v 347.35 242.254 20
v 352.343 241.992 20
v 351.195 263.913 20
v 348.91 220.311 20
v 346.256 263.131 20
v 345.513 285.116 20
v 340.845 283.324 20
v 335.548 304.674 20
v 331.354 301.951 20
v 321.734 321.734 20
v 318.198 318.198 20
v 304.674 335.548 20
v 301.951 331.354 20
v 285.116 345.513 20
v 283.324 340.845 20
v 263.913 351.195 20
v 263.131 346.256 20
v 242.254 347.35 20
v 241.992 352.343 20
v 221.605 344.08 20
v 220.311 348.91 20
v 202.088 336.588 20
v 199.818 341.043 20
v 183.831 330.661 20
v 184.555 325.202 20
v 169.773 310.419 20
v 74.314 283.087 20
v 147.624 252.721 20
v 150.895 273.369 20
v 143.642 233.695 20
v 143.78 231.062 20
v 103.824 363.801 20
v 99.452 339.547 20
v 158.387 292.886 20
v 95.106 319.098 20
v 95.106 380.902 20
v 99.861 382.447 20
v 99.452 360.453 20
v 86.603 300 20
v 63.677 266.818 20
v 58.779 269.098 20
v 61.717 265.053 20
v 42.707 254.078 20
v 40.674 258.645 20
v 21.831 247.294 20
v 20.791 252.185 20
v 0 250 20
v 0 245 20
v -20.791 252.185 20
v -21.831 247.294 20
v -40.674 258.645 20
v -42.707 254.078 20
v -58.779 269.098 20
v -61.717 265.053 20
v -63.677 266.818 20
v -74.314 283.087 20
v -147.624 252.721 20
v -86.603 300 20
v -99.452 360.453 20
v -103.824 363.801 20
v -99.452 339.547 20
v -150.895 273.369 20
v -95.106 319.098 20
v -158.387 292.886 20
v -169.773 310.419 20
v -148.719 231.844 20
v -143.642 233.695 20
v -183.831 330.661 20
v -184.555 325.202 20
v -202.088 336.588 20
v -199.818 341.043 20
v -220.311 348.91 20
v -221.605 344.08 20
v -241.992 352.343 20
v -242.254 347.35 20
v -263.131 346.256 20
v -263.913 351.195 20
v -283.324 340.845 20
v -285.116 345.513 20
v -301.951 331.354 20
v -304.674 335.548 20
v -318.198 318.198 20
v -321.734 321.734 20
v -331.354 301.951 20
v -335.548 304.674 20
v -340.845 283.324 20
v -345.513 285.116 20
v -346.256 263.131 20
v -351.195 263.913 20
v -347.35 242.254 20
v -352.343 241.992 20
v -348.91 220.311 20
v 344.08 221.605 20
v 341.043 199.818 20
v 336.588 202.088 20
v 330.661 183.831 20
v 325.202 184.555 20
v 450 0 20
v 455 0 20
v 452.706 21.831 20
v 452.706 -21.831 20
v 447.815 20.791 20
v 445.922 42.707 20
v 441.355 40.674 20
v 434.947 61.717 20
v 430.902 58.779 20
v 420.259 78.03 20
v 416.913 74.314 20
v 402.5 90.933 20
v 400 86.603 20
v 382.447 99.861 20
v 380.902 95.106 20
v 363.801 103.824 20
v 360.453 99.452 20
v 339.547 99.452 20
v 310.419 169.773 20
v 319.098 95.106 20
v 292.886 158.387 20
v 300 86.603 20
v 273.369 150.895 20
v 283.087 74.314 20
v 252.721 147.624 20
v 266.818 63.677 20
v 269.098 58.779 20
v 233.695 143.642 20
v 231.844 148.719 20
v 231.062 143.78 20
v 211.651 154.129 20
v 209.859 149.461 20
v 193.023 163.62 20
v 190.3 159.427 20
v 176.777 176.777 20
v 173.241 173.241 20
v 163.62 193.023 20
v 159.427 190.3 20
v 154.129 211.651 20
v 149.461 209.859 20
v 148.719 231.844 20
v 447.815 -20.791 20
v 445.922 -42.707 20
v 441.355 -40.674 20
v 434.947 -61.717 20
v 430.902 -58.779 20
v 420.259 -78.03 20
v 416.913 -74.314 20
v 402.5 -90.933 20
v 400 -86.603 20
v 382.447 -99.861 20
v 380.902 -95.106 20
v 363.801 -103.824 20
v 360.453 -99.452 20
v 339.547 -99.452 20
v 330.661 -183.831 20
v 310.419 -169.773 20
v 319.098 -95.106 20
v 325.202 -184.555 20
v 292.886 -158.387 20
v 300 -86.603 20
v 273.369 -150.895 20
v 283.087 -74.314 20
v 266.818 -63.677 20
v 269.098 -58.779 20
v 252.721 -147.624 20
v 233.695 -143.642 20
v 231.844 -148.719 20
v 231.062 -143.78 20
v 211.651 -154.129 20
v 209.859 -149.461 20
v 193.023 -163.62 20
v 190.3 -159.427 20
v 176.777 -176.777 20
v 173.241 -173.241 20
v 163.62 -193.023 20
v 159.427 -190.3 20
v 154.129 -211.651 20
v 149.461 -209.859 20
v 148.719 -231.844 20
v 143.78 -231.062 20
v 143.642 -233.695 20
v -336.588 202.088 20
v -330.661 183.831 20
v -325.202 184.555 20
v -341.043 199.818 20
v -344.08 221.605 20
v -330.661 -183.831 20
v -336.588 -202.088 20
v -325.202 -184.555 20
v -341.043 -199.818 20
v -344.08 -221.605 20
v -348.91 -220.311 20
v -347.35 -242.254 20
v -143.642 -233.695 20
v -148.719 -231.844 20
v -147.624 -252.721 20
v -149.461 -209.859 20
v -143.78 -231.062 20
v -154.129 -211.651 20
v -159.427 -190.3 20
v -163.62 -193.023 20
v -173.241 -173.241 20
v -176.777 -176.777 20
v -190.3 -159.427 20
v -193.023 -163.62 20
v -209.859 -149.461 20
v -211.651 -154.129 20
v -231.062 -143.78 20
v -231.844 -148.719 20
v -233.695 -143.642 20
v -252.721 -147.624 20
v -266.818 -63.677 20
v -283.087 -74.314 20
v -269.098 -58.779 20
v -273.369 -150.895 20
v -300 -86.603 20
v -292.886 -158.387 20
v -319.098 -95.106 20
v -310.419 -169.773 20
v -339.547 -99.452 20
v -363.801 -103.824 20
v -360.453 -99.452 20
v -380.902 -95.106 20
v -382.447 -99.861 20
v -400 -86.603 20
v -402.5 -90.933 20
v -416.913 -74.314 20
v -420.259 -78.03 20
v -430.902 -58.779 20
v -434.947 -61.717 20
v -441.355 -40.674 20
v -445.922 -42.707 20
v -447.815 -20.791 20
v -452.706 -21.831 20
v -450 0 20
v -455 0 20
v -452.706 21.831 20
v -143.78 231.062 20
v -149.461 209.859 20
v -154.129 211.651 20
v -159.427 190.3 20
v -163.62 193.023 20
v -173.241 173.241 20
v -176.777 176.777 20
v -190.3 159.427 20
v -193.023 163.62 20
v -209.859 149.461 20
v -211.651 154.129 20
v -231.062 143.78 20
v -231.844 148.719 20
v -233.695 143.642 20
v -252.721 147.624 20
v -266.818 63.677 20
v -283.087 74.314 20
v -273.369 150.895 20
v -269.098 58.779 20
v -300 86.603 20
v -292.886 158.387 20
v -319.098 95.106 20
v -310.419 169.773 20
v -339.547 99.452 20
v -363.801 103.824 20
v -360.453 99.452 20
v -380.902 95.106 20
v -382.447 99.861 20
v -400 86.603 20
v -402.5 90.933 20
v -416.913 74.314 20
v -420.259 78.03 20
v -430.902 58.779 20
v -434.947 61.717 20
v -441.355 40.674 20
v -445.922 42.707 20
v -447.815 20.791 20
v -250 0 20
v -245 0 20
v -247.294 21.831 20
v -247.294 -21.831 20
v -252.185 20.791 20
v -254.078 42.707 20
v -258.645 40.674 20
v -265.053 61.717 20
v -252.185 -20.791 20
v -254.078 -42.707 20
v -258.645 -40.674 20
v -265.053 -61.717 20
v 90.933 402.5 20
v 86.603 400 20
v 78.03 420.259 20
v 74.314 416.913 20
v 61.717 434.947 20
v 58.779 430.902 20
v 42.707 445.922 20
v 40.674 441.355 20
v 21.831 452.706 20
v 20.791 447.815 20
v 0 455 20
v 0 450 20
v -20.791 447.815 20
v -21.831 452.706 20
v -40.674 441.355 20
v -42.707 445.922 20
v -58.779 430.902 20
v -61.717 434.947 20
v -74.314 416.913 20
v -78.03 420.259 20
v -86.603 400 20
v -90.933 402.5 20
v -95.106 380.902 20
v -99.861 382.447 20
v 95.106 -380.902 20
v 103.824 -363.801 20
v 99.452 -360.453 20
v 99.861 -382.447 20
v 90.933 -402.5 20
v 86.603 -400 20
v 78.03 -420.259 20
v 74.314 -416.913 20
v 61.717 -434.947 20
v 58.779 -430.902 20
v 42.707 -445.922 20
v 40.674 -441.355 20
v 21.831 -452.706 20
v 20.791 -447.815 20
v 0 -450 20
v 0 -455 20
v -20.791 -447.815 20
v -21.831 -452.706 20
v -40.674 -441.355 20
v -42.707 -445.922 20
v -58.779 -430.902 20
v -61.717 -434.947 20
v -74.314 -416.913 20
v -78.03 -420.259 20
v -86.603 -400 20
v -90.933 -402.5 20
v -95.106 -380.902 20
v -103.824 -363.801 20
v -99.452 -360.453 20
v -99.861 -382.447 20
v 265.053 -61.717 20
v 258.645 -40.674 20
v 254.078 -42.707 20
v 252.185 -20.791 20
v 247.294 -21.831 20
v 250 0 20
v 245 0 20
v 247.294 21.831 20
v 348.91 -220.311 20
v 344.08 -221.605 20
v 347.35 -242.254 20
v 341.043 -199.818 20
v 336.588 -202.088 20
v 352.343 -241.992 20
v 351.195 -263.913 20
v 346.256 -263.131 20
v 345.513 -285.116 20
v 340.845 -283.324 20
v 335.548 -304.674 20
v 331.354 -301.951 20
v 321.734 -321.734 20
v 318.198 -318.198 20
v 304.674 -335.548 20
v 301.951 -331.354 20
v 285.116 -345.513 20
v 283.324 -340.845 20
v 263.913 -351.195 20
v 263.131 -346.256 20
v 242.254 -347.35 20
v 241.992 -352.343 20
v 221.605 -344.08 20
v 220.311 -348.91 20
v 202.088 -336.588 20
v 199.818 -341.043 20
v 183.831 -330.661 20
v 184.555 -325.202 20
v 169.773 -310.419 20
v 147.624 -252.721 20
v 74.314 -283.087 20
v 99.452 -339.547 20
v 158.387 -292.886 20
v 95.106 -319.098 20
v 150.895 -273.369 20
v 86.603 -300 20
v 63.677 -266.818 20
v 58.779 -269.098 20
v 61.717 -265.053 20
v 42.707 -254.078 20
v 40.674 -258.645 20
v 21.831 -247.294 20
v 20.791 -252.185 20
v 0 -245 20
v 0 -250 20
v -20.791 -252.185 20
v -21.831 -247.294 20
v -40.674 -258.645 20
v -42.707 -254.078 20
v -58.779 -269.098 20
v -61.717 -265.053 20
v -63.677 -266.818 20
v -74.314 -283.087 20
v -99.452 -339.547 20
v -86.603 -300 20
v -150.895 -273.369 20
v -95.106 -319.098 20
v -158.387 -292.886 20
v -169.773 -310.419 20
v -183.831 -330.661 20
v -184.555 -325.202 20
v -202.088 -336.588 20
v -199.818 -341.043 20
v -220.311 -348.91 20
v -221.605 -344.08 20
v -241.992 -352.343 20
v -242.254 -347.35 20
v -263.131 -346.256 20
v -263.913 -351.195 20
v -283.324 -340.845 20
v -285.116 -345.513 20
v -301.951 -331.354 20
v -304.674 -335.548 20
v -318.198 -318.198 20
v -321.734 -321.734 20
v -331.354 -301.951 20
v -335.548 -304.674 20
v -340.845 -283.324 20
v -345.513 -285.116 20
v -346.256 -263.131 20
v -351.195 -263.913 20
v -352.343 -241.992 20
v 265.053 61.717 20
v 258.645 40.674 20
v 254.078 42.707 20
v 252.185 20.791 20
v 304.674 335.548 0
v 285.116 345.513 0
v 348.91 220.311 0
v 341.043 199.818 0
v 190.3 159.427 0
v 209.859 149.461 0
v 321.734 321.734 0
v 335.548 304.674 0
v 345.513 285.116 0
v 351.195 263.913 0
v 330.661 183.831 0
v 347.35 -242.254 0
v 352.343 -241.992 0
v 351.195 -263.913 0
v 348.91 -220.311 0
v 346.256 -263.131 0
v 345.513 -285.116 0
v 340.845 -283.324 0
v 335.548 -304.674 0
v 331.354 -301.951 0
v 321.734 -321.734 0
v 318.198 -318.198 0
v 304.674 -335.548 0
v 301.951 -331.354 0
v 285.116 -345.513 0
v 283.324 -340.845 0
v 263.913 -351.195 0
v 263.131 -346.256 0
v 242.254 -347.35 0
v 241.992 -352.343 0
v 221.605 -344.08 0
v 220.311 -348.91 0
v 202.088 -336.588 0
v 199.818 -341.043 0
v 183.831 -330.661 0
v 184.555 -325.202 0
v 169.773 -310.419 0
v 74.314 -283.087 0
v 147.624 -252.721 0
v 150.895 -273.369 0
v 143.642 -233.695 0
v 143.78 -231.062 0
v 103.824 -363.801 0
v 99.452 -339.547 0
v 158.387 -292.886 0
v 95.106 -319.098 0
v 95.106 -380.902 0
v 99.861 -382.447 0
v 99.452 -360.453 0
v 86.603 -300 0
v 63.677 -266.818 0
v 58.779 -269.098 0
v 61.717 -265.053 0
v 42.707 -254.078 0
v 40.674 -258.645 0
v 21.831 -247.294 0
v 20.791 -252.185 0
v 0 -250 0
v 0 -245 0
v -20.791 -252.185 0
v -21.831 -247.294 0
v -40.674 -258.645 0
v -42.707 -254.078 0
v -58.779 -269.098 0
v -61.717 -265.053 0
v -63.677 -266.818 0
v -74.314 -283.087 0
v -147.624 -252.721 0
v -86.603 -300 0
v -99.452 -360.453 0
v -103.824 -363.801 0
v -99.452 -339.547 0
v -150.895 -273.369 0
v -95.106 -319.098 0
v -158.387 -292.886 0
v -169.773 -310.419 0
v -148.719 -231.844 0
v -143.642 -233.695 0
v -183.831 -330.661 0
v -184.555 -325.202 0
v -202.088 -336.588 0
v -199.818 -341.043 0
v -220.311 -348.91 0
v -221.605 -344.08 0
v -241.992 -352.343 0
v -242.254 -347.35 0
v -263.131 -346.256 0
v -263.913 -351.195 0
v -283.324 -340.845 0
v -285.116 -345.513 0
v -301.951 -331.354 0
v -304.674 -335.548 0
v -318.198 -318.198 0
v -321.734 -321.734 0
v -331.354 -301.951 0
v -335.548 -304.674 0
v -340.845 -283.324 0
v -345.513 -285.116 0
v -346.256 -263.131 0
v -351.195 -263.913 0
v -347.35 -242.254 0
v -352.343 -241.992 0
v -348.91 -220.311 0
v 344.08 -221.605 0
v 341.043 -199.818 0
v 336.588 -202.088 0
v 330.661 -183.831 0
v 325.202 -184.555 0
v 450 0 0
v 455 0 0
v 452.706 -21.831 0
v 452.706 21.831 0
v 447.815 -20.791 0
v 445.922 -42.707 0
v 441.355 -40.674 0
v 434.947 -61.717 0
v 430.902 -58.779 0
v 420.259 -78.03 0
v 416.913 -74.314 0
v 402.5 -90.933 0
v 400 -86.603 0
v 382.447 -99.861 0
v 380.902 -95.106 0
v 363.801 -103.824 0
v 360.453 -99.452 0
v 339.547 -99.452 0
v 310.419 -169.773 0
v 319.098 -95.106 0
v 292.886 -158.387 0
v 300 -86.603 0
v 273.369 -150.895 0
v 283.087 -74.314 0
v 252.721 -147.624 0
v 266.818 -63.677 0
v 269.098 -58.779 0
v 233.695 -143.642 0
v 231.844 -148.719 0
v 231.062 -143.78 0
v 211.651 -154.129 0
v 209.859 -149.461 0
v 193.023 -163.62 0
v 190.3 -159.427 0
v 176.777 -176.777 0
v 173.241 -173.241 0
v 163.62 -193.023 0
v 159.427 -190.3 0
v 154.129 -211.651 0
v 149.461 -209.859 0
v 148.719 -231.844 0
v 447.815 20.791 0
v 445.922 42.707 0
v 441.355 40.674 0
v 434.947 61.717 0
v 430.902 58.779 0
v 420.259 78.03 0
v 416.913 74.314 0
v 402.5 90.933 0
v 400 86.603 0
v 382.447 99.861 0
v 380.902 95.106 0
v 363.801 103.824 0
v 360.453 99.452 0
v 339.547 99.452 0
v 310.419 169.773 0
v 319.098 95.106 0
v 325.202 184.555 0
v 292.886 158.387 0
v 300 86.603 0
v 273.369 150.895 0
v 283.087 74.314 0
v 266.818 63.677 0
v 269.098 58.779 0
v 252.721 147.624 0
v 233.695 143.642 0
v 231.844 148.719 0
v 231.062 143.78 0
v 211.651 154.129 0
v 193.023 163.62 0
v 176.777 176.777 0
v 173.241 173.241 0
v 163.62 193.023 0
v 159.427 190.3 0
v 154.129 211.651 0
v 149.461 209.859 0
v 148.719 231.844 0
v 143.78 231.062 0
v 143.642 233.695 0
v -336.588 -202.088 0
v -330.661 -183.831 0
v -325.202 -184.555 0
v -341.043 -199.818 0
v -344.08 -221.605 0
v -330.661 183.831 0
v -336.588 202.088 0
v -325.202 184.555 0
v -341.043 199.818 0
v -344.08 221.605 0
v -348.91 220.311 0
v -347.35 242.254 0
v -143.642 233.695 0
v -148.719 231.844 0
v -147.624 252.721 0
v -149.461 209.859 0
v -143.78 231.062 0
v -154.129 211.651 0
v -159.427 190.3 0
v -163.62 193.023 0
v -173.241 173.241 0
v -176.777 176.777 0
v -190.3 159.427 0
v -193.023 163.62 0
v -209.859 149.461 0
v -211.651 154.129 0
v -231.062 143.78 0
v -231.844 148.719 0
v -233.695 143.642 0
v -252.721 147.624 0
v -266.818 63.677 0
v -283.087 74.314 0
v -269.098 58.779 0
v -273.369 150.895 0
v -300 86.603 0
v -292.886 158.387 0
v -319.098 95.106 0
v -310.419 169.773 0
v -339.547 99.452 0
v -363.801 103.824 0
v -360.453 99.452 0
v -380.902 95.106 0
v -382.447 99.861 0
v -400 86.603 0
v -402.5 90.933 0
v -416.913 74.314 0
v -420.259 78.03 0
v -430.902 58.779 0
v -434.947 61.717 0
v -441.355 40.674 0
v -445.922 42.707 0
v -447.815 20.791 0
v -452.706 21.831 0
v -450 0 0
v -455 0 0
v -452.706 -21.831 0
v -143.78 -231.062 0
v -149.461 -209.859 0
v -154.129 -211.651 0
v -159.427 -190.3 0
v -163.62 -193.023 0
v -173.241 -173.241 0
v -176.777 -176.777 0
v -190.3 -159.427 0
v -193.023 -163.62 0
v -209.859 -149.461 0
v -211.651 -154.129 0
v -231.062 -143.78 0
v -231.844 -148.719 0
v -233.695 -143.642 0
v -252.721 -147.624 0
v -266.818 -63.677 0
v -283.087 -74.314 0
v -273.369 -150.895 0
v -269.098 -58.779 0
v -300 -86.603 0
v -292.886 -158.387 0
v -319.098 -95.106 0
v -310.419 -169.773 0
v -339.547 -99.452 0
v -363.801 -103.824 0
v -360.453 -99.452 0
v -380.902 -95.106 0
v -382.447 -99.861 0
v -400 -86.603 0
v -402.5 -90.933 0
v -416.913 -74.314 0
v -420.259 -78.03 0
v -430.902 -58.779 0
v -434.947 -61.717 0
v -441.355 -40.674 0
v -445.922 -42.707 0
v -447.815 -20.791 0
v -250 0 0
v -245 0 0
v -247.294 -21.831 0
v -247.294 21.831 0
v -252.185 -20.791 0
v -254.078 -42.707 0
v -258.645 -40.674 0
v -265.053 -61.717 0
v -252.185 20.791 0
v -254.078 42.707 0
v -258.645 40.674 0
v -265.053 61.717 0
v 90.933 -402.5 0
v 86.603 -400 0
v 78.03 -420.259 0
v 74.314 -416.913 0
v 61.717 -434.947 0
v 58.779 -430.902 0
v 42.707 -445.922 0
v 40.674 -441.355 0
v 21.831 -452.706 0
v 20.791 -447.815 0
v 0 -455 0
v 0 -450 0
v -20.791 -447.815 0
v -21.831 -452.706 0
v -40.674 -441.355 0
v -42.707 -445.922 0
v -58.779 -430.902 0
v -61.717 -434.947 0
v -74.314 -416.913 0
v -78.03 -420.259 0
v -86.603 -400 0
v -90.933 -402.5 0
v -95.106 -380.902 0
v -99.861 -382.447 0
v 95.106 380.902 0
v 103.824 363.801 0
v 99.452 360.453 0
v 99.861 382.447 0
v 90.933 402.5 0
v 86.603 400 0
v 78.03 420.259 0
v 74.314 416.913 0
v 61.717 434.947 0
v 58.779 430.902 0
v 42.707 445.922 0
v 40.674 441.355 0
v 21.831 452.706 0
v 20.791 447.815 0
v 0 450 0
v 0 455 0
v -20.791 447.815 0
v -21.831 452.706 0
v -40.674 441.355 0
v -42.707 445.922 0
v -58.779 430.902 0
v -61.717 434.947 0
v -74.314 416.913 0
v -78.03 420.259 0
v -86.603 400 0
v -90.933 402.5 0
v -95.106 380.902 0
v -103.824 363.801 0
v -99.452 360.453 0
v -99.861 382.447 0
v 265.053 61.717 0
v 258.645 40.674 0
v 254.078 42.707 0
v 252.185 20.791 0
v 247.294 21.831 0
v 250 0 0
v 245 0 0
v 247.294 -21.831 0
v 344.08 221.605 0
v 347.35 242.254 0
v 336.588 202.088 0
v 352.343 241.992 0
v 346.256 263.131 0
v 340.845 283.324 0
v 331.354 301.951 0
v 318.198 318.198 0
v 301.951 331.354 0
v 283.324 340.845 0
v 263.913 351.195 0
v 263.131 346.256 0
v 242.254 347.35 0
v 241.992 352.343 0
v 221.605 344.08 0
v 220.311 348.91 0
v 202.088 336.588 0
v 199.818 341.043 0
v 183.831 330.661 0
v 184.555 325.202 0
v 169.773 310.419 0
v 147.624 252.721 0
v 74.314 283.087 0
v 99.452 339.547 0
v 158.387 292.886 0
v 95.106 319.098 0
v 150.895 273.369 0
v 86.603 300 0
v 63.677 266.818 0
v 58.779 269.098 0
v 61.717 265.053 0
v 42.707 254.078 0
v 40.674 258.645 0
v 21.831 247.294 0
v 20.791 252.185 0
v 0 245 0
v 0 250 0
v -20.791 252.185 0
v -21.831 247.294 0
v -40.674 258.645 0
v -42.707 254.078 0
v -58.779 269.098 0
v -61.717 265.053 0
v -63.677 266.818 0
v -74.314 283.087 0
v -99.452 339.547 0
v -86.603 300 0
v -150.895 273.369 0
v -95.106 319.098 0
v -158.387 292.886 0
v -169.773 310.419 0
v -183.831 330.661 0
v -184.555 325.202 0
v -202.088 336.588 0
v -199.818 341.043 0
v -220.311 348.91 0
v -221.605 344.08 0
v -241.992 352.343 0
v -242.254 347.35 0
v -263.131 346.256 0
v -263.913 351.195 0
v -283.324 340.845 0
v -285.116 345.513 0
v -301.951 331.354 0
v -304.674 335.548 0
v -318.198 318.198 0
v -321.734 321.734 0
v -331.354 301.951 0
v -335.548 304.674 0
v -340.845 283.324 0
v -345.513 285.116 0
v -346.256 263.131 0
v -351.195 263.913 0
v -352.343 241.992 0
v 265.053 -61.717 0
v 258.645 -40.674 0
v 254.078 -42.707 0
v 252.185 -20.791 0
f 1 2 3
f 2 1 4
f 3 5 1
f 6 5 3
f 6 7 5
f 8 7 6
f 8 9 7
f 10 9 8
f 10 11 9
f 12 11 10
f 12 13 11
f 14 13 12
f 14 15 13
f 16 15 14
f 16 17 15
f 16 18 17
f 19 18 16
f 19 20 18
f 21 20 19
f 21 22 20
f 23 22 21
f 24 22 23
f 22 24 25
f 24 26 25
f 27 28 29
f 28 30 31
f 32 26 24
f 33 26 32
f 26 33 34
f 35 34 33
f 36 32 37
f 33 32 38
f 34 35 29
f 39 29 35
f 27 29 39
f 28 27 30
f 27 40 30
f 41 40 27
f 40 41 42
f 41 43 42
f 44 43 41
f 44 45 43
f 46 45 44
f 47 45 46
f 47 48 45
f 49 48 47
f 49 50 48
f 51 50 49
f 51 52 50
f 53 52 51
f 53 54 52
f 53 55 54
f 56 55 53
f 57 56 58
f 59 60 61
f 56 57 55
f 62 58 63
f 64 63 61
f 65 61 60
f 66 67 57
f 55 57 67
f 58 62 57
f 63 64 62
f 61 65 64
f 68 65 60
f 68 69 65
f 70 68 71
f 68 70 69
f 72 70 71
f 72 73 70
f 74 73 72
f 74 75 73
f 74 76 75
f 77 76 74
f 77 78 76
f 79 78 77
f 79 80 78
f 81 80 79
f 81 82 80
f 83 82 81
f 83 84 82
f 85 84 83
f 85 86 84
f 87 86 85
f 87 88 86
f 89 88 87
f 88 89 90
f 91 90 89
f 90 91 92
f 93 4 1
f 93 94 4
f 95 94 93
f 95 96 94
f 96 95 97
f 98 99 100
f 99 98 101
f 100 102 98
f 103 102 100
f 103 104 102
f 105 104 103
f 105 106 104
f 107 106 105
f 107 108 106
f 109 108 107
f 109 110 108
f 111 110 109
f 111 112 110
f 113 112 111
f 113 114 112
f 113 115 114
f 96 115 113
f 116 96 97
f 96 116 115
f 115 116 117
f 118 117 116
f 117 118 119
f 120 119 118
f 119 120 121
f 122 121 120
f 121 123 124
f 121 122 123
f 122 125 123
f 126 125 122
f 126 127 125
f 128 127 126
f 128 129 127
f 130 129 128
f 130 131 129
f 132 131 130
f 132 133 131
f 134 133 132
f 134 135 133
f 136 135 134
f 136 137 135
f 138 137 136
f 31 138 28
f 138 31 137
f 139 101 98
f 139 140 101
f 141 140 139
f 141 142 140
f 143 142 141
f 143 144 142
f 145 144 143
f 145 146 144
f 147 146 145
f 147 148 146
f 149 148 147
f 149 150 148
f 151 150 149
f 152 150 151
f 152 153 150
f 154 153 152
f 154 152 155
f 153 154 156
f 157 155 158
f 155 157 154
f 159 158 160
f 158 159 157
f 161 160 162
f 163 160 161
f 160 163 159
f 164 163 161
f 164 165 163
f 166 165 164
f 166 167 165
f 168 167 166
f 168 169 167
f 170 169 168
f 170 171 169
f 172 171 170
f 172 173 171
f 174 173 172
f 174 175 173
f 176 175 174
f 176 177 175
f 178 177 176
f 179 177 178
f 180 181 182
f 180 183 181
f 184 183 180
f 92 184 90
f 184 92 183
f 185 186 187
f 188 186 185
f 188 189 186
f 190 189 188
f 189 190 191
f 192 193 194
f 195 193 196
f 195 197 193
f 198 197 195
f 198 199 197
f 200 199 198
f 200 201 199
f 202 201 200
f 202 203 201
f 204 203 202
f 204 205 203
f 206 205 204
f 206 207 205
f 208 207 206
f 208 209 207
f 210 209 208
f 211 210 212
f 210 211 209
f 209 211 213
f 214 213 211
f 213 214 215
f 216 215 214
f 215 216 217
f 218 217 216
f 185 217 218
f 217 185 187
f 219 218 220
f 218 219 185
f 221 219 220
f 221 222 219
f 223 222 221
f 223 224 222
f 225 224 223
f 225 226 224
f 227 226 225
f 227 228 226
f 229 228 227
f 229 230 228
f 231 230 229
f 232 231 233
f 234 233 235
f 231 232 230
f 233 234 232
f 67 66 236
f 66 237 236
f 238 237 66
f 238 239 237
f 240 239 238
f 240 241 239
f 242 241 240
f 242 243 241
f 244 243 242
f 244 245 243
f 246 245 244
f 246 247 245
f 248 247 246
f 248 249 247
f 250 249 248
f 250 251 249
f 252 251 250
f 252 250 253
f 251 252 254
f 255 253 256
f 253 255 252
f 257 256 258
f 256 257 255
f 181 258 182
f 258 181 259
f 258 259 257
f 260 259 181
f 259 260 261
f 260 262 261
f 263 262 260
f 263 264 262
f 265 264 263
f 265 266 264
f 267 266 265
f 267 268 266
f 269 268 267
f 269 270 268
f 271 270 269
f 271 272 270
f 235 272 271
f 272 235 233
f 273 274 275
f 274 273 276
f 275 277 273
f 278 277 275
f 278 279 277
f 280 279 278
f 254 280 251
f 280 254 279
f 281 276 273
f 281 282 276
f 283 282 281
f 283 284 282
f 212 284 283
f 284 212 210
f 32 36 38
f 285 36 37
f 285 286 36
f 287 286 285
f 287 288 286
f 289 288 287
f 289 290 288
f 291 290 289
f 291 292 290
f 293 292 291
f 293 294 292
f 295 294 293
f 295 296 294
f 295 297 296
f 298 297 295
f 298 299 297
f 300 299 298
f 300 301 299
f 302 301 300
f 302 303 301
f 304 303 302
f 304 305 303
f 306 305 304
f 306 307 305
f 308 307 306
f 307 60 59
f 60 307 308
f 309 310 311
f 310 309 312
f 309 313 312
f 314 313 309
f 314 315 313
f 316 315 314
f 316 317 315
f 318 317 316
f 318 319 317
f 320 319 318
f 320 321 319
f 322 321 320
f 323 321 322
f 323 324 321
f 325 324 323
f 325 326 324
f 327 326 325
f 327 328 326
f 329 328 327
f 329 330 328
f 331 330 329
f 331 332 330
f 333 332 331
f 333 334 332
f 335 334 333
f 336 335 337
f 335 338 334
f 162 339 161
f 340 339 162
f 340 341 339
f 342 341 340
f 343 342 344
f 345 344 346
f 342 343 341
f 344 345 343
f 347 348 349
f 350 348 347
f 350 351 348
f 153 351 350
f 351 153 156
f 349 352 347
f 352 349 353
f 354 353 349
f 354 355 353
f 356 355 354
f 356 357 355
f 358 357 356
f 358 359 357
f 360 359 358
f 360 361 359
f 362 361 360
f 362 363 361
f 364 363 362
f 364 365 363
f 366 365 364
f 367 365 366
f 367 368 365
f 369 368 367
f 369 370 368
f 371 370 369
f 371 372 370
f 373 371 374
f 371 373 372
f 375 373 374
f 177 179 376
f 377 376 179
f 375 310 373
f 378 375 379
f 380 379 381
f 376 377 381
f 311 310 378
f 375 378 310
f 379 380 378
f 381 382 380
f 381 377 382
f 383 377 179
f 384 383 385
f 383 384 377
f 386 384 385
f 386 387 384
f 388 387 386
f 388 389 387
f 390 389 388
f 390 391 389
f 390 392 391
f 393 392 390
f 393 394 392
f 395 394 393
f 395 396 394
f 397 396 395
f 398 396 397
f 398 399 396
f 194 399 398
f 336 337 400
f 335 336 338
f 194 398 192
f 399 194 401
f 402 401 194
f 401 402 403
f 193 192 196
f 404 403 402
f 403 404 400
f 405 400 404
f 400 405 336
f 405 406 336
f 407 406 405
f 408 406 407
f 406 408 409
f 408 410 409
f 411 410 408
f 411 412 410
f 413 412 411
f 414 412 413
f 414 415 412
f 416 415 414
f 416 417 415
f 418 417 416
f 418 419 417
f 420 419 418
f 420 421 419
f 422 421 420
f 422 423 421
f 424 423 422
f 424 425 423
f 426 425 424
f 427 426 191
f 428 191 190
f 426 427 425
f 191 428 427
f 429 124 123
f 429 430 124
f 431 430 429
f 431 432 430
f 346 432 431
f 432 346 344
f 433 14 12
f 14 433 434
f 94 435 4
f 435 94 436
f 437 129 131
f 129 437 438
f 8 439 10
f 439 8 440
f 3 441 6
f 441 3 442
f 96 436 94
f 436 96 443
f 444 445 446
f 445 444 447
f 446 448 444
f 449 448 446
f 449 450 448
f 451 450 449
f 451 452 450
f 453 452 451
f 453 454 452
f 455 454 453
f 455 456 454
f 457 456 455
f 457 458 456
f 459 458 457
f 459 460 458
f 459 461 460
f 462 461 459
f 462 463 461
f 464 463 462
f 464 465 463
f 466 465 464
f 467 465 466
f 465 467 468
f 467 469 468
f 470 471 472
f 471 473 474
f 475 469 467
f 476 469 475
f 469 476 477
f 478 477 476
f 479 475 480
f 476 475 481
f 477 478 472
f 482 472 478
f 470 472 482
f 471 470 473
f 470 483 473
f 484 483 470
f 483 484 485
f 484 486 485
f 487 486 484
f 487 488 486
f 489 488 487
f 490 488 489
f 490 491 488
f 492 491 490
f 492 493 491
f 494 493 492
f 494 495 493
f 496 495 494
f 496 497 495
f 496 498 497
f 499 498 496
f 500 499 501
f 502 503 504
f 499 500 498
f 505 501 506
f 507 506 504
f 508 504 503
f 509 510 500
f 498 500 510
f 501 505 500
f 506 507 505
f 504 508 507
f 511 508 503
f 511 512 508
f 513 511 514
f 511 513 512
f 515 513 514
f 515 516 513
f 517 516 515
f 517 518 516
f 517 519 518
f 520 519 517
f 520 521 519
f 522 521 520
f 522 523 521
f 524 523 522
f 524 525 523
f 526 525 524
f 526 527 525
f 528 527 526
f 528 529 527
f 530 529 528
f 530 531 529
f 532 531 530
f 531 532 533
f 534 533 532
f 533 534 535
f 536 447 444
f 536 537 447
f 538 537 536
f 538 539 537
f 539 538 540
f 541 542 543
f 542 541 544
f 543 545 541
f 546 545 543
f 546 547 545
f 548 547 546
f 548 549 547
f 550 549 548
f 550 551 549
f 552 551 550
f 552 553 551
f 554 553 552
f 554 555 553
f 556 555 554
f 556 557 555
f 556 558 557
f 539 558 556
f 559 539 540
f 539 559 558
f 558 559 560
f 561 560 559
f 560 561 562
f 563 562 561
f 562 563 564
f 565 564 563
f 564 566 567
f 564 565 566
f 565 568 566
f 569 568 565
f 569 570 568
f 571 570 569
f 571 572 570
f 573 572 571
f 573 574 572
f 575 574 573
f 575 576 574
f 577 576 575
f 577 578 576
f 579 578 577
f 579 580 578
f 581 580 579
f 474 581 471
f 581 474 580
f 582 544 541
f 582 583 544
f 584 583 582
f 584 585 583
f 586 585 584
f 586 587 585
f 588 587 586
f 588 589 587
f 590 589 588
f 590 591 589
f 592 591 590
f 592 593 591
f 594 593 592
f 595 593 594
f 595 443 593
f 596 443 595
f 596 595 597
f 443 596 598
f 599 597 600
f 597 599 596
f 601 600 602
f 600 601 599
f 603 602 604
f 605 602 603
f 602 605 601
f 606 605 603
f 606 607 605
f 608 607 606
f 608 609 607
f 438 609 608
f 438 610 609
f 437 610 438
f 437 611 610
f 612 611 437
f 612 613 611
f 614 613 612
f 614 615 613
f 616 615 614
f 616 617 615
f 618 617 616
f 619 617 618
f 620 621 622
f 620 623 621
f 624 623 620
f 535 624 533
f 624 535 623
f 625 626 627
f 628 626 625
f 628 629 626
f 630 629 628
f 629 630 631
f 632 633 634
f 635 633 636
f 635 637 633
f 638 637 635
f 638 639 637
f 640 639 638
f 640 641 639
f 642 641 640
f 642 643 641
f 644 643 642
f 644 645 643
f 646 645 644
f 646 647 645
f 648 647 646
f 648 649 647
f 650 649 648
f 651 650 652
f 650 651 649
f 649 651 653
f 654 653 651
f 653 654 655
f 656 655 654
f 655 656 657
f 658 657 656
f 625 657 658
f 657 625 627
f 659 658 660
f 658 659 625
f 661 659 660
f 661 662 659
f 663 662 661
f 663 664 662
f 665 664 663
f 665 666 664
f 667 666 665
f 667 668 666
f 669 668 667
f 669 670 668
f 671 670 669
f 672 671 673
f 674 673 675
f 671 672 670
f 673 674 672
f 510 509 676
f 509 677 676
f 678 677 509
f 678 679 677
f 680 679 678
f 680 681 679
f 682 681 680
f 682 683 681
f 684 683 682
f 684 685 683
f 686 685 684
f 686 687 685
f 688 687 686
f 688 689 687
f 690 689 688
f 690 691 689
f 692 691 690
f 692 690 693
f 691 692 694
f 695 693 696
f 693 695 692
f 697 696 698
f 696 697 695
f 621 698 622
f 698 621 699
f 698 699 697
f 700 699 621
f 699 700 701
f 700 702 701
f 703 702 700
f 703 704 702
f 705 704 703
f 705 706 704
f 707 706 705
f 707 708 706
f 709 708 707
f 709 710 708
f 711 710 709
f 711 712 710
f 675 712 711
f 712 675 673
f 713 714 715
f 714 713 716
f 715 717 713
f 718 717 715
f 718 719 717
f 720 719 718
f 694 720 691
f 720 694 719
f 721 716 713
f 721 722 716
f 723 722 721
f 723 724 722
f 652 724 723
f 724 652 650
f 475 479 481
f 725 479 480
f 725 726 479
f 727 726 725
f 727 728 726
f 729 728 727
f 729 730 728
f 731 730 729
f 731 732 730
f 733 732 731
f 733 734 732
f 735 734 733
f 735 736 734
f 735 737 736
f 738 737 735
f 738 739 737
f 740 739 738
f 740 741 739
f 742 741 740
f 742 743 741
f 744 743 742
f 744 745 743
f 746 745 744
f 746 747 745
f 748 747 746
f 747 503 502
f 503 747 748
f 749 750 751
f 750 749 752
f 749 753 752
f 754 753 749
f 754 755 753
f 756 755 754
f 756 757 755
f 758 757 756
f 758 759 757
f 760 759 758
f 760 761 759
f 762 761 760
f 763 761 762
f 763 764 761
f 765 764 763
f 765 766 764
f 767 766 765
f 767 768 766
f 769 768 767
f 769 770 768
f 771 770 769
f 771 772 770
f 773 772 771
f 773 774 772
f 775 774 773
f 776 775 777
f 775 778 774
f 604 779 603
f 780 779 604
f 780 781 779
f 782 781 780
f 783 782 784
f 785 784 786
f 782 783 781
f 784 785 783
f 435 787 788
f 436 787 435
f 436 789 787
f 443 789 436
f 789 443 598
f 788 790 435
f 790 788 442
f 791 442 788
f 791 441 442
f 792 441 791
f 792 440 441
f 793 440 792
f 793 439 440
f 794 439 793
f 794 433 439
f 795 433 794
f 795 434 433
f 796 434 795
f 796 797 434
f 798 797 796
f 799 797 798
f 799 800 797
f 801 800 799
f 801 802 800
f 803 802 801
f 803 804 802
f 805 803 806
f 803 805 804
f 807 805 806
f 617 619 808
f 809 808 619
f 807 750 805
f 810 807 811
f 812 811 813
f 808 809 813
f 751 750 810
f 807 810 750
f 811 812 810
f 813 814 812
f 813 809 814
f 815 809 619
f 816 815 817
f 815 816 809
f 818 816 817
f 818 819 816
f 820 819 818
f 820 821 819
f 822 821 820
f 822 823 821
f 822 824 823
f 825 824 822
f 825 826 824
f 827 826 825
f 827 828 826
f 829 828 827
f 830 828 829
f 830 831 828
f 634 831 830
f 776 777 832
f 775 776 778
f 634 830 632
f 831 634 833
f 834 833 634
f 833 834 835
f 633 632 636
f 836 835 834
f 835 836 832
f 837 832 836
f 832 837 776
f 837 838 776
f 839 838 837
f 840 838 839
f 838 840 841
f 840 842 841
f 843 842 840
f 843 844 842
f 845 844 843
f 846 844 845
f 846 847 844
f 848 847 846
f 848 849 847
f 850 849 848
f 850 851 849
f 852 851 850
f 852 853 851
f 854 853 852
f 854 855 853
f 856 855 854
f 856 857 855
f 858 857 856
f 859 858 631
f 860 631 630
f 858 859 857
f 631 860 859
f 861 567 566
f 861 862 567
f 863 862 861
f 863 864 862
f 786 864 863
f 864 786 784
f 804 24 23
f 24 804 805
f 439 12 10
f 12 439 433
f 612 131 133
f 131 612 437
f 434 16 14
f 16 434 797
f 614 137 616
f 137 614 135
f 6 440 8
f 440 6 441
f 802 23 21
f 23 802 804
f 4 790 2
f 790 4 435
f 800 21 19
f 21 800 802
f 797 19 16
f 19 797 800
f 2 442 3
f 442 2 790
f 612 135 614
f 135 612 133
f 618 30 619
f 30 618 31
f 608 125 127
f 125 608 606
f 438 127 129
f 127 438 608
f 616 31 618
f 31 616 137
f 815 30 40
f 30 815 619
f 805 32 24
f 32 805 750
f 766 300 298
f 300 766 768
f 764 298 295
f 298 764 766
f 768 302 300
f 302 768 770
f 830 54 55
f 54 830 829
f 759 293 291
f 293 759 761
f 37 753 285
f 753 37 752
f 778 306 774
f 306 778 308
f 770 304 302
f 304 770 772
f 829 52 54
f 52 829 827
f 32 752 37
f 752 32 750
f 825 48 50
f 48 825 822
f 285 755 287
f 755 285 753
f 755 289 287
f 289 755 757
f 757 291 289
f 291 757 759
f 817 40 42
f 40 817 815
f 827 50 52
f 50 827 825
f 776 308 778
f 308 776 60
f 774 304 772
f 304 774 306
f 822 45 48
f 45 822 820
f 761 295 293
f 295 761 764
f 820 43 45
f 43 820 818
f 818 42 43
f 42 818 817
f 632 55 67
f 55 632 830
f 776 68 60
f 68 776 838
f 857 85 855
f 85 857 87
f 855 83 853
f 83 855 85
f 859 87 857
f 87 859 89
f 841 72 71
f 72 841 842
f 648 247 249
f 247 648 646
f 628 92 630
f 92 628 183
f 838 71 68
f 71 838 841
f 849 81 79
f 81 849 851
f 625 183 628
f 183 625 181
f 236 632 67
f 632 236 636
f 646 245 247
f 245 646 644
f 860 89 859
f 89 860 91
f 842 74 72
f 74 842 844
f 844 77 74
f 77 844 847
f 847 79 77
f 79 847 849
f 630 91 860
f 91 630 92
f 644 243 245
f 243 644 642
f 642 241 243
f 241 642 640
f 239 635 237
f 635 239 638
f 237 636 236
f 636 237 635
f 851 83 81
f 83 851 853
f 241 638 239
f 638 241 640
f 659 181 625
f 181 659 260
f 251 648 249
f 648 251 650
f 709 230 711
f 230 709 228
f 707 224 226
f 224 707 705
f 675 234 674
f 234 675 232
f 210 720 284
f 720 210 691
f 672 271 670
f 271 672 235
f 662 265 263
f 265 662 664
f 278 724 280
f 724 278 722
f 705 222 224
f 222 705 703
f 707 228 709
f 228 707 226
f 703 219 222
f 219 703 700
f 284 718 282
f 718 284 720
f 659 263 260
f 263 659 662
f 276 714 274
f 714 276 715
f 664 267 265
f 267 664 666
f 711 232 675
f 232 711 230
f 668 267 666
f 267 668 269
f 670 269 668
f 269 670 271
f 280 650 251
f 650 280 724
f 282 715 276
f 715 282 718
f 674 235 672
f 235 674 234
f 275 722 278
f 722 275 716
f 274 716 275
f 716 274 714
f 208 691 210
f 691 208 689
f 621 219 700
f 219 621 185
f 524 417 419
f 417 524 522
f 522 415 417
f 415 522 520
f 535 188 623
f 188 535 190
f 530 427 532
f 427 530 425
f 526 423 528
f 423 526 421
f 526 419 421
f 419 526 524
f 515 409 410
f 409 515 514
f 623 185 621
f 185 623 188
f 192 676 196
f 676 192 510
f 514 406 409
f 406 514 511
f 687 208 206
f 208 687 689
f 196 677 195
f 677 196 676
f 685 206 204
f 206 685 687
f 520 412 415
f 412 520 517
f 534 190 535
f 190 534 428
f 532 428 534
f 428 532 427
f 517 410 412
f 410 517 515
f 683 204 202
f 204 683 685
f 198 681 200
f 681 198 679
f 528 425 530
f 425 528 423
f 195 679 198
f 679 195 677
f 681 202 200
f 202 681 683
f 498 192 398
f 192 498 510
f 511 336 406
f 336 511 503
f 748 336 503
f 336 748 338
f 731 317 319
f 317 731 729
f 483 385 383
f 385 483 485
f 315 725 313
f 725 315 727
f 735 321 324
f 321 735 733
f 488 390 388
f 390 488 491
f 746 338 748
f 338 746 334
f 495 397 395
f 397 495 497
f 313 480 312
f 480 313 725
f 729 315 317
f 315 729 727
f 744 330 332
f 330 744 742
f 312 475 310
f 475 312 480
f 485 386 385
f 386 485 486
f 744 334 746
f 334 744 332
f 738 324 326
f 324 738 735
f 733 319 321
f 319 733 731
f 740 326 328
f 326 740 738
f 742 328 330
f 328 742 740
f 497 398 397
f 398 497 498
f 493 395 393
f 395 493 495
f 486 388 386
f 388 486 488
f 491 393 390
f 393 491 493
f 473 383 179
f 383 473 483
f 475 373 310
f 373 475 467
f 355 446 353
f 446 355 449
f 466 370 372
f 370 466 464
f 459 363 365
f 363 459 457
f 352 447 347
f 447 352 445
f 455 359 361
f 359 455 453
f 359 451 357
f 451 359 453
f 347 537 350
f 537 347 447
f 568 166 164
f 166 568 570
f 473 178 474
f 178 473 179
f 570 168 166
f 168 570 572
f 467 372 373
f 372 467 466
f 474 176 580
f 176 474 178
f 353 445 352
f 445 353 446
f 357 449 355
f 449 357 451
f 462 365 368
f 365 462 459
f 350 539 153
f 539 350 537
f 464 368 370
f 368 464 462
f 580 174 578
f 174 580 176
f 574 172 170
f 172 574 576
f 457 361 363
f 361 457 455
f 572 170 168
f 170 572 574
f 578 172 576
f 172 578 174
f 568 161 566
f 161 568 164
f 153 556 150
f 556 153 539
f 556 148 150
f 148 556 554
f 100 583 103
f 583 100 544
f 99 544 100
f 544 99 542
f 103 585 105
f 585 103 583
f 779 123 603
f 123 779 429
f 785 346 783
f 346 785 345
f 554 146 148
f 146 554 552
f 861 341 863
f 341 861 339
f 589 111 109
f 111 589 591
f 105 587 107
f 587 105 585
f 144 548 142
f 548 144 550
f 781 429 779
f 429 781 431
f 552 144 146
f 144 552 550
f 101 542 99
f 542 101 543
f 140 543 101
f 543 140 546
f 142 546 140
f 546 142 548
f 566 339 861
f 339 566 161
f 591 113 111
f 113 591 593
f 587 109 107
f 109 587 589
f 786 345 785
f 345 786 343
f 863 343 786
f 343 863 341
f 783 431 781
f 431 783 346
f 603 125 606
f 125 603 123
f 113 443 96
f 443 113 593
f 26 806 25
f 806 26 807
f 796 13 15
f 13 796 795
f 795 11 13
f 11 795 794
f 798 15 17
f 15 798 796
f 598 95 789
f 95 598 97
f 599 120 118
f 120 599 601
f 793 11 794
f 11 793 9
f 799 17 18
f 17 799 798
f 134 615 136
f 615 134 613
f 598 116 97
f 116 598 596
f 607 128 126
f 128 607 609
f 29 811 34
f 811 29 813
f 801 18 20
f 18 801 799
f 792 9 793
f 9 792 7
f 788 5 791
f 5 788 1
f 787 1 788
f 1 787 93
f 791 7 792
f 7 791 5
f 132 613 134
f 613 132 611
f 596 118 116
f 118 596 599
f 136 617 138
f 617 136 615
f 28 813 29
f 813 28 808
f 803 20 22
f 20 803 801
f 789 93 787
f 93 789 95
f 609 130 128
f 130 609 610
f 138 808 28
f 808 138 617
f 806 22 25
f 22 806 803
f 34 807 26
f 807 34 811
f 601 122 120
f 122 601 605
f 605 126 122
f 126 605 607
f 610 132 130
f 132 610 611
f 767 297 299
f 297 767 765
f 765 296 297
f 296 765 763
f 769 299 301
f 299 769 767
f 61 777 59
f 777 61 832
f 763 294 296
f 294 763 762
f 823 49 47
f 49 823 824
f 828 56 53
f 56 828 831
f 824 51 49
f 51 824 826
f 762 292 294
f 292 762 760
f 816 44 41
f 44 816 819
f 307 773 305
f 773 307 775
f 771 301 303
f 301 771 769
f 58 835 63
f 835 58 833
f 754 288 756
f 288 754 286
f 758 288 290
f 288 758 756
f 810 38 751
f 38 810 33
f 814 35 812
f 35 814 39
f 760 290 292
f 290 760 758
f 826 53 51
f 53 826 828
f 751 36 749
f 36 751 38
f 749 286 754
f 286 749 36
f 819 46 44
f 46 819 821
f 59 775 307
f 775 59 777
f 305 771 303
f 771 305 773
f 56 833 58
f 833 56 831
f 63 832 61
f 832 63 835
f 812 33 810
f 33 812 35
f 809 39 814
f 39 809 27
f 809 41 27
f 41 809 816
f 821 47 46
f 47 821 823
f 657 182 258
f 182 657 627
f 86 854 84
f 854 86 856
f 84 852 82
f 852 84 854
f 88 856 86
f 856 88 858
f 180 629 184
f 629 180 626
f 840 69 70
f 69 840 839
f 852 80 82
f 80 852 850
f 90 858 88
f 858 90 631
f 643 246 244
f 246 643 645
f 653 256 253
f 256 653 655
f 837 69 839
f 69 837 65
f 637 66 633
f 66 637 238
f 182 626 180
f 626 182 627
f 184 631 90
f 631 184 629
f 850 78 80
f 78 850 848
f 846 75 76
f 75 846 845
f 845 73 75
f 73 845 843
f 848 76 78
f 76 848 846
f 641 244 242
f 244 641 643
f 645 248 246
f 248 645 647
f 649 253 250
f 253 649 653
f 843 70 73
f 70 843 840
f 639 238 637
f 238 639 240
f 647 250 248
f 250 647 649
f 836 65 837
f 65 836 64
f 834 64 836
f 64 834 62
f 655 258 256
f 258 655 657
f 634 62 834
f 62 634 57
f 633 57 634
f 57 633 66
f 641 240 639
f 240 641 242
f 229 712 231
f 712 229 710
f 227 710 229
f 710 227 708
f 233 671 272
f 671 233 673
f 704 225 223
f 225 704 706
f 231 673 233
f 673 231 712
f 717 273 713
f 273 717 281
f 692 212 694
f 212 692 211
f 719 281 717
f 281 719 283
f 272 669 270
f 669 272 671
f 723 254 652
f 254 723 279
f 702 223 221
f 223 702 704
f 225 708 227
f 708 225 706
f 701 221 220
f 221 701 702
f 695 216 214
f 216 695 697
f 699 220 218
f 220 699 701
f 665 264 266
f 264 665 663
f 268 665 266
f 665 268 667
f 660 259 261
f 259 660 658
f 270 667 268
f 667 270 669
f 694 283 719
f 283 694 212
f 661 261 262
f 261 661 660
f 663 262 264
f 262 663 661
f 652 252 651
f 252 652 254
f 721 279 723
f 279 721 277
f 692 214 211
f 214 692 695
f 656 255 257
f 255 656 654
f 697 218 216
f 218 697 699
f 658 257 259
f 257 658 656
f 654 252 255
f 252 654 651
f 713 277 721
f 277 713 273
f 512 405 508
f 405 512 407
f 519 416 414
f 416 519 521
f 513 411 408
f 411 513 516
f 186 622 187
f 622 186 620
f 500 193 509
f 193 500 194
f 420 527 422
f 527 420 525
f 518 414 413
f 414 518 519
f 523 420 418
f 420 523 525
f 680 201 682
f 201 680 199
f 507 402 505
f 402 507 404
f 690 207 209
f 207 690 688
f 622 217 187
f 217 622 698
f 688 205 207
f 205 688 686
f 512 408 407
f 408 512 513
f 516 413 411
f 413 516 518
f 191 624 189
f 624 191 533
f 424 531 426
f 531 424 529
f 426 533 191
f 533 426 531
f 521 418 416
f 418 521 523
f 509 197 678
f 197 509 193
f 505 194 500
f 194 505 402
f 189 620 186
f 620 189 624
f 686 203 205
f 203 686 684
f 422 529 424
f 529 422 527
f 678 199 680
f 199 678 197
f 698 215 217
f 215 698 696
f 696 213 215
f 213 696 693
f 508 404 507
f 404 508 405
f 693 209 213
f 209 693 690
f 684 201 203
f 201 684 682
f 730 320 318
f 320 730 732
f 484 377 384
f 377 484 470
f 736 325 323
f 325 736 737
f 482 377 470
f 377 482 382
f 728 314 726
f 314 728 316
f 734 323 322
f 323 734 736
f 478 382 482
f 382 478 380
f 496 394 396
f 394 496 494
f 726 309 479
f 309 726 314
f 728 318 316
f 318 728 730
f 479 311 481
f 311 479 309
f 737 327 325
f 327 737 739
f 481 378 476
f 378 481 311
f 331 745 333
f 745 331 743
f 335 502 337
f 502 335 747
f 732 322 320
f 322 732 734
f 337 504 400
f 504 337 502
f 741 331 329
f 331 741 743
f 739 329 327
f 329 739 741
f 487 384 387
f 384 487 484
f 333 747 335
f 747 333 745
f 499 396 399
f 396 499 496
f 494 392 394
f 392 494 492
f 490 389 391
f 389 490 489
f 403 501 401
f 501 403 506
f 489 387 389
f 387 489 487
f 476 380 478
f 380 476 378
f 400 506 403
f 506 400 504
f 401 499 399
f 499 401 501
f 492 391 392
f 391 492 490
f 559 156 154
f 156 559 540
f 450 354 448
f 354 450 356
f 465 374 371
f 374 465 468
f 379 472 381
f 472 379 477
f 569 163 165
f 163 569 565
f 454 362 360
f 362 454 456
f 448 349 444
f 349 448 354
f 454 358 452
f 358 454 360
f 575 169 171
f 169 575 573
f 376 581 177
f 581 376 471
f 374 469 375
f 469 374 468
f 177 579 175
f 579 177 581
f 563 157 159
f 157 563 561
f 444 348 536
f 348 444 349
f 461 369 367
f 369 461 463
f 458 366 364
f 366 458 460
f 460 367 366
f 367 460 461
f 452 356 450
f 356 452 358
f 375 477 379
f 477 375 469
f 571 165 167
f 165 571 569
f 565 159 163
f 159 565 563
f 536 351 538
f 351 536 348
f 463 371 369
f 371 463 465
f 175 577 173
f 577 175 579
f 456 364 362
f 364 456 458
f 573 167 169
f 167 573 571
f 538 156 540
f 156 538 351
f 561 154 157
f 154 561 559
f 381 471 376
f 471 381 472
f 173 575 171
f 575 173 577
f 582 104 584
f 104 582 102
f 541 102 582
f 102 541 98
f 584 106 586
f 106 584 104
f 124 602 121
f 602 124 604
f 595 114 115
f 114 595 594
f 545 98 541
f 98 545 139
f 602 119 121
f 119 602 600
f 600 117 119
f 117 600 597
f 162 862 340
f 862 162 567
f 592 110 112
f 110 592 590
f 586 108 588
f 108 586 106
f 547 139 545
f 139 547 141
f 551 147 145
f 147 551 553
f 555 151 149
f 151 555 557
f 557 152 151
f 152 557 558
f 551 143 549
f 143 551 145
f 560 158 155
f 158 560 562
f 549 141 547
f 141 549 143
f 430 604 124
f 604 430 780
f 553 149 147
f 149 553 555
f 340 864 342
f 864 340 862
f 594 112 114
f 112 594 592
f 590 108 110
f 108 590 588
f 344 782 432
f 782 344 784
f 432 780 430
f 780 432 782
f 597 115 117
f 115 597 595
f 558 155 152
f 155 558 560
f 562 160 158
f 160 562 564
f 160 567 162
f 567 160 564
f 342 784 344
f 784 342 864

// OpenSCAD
magnets = 8; /* Magnets in holder */
magnet_radius = 100; /* mm */
magnet_height = 20; /* mm */
wheel_diameter = cm_to_mm(90); /* cm */
wheel_radius = wheel_diameter / 2;
thickness = 5; /* Extra thickness around magnets */
hull_divider = 2; /* Amount to divide the hull by */


function cm_to_mm(cm) = cm * 10;

module magnet_transform(i, x, radius)
{
	rotate([0, 0, (360 / magnets) * i]) {
		translate([x, 0, 0]) {
			cylinder(magnet_height, r = radius, true);
		}
	}
}

difference()
{
	/* Outer shell, magnets subtracted from */
	union()
	{
		for (i = [1:magnets]) {
			magnet_transform(i, wheel_radius - magnet_radius, magnet_radius + thickness);
			hull()
			{
				magnet_transform(i, wheel_radius - magnet_radius, (magnet_radius + thickness) / hull_divider);
				magnet_transform(i + 1, wheel_radius - magnet_radius, (magnet_radius + thickness) / hull_divider);
			}
		}
	}
	/* Magnets to be subtracted */
	union()
	{
		for (i = [1:magnets]) {
			magnet_transform(i, wheel_radius - magnet_radius, magnet_radius);
		}
	}
}
